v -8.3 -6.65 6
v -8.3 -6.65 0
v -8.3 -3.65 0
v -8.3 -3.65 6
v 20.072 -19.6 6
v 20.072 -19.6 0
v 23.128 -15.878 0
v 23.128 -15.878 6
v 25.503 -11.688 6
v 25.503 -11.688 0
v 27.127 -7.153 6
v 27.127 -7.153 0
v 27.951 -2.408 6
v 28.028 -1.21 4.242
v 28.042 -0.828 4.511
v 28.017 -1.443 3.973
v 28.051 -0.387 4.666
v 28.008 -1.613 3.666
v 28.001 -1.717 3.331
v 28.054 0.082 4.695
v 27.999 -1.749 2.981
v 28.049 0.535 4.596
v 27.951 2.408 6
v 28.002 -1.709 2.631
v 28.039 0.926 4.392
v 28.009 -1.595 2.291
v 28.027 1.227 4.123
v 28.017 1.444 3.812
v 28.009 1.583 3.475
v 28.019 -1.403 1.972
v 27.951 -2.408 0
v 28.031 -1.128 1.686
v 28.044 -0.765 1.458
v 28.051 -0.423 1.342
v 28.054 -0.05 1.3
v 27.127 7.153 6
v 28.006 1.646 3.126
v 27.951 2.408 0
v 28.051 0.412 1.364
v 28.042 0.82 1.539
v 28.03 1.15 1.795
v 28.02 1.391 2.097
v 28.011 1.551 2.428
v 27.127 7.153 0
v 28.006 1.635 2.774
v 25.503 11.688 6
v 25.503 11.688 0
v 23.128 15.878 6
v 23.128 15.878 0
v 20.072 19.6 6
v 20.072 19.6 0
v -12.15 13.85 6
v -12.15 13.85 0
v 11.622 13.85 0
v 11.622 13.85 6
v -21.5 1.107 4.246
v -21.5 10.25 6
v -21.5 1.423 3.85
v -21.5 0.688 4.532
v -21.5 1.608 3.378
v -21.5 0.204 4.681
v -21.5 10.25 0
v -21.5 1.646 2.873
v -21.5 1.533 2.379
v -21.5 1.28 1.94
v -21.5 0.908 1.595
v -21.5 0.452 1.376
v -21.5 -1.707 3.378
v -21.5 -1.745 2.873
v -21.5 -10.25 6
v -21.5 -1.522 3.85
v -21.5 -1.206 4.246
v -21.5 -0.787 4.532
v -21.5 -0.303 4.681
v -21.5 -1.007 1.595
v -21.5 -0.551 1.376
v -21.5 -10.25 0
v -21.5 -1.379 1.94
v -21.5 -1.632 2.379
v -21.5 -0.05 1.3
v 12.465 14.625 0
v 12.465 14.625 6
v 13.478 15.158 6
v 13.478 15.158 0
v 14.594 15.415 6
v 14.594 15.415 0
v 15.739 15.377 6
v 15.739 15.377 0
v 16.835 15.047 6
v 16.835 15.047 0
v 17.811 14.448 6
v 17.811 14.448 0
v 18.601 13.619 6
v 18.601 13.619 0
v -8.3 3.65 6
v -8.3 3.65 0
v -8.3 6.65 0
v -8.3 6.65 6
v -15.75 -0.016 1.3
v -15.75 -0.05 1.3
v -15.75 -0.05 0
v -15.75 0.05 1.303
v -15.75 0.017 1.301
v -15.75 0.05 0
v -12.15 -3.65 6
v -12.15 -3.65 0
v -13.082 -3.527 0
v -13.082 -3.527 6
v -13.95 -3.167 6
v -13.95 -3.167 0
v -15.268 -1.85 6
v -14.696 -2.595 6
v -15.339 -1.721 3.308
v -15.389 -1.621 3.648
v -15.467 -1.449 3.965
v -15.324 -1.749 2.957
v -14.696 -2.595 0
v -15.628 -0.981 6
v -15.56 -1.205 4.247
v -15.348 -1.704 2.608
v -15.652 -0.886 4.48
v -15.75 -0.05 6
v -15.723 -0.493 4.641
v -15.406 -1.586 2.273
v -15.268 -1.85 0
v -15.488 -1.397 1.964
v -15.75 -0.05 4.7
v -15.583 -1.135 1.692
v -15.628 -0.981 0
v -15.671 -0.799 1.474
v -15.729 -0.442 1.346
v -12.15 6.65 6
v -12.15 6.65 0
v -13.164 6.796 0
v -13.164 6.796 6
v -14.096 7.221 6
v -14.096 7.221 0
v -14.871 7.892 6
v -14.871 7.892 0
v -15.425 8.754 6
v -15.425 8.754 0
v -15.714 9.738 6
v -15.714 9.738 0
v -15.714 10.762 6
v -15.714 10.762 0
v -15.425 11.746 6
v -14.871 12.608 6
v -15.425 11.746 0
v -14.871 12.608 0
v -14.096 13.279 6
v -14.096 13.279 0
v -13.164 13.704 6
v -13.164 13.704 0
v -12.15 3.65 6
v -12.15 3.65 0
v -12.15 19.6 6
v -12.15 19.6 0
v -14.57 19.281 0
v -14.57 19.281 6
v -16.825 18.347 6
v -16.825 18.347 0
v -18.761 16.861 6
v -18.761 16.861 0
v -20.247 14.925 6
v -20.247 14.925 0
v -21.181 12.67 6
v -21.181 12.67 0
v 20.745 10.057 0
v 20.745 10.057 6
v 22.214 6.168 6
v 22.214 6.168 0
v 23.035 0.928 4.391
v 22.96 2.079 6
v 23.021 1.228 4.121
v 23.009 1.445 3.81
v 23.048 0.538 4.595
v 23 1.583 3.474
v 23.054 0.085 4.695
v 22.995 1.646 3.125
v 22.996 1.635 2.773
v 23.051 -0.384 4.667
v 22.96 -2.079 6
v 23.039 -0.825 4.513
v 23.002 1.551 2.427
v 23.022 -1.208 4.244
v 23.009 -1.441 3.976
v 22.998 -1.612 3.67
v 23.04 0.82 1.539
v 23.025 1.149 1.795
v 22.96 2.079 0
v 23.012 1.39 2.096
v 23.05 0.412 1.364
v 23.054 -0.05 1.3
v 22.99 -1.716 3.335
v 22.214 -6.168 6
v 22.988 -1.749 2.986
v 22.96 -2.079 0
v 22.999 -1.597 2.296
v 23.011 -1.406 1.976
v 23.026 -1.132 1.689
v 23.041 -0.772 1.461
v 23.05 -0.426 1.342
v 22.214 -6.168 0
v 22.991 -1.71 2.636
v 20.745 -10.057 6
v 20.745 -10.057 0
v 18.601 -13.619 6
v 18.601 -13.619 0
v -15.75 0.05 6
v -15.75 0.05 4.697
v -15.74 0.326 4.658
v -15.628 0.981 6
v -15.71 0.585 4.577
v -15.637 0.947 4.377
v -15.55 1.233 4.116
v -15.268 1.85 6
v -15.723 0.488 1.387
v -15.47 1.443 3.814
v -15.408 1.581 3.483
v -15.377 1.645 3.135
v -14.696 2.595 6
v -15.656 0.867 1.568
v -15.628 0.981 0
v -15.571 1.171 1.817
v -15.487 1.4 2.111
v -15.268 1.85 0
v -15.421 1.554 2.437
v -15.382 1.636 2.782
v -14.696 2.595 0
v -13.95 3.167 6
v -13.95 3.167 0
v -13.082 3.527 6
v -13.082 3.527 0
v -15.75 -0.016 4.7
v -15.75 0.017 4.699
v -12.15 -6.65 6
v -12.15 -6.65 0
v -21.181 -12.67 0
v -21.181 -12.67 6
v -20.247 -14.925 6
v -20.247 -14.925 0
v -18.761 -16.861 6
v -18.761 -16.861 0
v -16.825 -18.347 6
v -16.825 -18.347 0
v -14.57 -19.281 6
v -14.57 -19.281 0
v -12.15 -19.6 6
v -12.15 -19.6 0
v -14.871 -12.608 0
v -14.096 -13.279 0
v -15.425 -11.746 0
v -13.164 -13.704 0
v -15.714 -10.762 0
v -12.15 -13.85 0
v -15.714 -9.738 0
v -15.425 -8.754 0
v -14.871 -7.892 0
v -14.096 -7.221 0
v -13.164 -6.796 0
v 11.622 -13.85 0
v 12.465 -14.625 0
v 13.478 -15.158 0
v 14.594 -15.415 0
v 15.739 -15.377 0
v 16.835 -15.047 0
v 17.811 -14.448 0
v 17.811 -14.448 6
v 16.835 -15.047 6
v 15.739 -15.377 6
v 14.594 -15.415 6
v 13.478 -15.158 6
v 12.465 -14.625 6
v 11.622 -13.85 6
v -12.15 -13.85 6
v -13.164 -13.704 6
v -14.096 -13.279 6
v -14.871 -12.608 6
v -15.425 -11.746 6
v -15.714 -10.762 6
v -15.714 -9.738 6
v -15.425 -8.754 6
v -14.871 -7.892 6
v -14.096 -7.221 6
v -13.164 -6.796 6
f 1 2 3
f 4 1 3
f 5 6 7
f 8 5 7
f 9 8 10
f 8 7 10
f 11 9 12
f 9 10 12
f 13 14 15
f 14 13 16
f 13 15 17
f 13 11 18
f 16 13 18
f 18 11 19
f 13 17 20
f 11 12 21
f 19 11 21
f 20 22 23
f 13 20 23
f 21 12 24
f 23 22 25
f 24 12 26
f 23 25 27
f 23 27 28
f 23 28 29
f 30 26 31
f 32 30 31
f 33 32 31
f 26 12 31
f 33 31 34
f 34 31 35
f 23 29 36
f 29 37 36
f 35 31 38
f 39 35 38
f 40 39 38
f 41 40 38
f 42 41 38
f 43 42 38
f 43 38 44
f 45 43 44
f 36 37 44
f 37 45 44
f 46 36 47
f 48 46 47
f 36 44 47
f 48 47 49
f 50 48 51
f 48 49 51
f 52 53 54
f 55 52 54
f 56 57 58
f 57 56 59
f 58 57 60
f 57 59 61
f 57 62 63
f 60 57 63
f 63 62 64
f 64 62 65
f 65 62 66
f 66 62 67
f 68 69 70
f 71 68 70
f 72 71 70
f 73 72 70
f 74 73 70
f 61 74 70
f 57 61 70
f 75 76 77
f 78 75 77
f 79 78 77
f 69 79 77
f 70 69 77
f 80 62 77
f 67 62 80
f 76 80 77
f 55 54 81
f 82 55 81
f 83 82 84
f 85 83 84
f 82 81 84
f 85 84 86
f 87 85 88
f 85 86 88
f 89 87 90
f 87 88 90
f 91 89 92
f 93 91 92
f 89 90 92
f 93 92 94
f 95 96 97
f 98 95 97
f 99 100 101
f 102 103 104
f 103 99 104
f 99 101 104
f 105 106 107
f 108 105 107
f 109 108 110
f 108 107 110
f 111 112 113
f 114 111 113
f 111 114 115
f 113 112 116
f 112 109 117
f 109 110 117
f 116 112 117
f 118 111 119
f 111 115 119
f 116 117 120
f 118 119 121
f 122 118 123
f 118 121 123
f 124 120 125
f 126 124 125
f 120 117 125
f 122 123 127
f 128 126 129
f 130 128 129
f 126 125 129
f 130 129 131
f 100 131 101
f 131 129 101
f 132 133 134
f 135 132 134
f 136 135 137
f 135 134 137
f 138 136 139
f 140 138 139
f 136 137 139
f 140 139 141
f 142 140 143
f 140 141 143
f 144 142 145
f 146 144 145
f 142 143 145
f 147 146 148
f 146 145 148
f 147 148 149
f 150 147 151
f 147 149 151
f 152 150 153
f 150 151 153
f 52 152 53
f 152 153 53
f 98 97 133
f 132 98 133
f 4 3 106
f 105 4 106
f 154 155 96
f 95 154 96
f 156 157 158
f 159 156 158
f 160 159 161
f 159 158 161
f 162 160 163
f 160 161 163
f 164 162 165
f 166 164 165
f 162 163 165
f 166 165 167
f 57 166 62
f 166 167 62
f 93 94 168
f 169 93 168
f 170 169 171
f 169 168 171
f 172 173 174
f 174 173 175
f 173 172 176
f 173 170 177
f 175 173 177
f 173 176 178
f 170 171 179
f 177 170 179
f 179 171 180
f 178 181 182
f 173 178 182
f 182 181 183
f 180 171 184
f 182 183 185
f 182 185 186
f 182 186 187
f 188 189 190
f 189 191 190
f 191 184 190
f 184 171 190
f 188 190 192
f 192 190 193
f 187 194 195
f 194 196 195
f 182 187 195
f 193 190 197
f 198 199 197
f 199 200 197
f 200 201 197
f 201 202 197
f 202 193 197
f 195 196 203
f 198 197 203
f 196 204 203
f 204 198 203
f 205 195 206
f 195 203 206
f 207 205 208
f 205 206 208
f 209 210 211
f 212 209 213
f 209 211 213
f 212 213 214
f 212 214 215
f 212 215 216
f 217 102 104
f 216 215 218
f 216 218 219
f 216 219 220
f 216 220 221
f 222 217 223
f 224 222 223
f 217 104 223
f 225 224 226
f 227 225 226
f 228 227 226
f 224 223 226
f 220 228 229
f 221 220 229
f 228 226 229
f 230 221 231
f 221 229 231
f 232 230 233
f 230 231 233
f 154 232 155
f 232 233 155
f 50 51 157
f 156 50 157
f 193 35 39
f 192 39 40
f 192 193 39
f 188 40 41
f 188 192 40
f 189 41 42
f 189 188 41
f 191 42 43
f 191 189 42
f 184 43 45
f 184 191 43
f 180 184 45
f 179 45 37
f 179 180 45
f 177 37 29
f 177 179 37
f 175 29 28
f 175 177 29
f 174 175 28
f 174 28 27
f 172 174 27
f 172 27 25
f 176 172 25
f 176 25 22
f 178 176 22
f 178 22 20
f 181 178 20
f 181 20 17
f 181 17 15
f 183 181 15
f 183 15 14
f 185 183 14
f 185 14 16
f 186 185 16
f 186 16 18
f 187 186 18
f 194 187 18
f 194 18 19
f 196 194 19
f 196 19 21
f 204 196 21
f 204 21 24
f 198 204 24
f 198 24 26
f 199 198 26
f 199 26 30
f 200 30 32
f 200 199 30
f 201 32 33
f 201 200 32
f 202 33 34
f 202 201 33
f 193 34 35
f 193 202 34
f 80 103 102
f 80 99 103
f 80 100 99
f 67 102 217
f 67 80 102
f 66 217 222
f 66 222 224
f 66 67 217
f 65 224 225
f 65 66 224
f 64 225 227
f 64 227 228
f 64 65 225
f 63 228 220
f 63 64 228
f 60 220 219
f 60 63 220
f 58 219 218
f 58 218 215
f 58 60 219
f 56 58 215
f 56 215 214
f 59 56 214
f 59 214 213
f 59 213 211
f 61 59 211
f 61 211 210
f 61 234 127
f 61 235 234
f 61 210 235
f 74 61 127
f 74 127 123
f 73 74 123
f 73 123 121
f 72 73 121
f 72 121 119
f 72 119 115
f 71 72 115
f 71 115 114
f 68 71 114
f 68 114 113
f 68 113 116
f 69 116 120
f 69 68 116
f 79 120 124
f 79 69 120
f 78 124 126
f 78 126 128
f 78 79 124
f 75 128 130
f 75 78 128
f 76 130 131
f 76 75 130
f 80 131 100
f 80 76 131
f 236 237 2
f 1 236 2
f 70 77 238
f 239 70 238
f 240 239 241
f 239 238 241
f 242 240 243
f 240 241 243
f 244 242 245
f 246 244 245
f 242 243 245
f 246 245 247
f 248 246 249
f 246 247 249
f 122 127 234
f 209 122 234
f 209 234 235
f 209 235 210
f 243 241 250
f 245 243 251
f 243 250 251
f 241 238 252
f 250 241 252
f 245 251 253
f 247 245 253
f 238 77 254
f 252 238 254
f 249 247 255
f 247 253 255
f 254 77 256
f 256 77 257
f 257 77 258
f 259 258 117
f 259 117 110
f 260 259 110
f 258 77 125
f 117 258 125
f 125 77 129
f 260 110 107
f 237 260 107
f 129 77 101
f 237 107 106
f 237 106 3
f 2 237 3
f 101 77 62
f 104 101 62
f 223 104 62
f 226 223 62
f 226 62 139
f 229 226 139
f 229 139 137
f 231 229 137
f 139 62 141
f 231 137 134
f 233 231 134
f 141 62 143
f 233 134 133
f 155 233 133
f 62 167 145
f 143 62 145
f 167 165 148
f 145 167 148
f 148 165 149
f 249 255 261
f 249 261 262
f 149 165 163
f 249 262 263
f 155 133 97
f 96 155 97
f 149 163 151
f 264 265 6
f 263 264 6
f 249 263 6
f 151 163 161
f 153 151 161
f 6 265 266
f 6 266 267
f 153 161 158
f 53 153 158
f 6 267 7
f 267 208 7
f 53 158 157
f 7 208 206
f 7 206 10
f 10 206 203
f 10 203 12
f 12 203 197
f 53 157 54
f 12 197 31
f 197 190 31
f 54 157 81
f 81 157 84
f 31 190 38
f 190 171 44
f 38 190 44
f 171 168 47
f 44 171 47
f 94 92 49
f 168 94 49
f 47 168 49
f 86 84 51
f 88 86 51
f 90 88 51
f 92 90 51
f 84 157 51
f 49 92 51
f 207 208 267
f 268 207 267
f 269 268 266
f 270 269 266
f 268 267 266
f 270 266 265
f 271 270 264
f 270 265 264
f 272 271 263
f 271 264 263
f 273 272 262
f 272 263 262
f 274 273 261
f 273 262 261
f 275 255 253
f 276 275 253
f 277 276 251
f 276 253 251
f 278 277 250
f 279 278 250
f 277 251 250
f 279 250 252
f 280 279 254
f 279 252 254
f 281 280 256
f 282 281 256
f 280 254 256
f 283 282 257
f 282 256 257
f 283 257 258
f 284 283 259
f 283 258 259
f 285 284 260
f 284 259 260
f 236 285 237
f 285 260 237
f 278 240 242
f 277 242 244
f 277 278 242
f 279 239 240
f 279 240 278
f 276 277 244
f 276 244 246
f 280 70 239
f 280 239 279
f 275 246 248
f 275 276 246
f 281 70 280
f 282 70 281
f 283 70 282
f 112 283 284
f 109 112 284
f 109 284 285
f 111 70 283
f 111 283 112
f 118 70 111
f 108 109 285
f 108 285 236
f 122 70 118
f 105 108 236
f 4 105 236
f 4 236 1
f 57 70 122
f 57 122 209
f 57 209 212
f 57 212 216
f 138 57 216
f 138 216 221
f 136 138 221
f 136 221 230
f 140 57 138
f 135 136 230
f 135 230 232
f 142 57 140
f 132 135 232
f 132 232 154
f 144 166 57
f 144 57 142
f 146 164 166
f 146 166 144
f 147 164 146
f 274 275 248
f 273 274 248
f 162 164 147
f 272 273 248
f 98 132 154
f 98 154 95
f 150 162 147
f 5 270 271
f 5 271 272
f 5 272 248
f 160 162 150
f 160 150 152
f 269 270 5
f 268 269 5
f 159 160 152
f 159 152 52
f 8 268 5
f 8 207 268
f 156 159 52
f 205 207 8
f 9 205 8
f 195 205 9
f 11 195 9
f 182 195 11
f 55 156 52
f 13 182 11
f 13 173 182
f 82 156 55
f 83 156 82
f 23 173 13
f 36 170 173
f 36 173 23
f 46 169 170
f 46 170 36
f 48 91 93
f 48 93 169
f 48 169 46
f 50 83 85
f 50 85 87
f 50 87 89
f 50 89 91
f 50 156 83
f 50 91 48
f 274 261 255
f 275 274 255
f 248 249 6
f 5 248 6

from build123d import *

# Parameters (mm, degrees)
EXTRUDE_1_DEPTH          = 6
CUT_EXTRUDE_1_DEPTH      = 35.74465435
CUT_EXTRUDE_1_DEPTH_BACK = 35.74465435
SKETCH_2_R               = 1.7


with BuildPart() as part:
    # 草图1 → 凸台-拉伸1 (new body)
    with BuildSketch(Plane.XY):
        with BuildLine():
            Line((20.071646816, 19.6), (-12.15, 19.6))
            ThreePointArc((-12.15, 19.6), (-18.761448404, 16.861448404), (-21.5, 10.25))
            Line((-21.5, 10.25), (-21.5, -10.25))
            ThreePointArc((-21.5, -10.25), (-18.761448404, -16.861448404), (-12.15, -19.6))
            Line((-12.15, -19.6), (20.071646816, -19.6))
            ThreePointArc((20.071646816, -19.6), (28.054072893, 0), (20.071646816, 19.6))
        make_face()
        with BuildLine():
            ThreePointArc((11.6217341, 13.850243366), (15.167616283, 15.432881266), (18.601156804, 13.619370123))
            ThreePointArc((18.601156804, 13.619370123), (23.054072893, 0), (18.601156804, -13.619370123))
            ThreePointArc((18.601156804, -13.619370123), (15.167616283, -15.432881266), (11.6217341, -13.850243366))
            Line((11.6217341, -13.850243366), (-12.15, -13.850243366))
            ThreePointArc((-12.15, -13.850243366), (-15.750243366, -10.25), (-12.15, -6.649756634))
            Line((-12.15, -6.649756634), (-8.3, -6.649756634))
            Line((-8.3, -6.649756634), (-8.3, -3.649756634))
            Line((-8.3, -3.649756634), (-12.15, -3.649756634))
            ThreePointArc((-12.15, -3.649756634), (-14.695756498, -2.595269766), (-15.750243366, -0.049513268))
            Line((-15.750243366, -0.049513268), (-15.750243366, 0.049513268))
            ThreePointArc((-15.750243366, 0.049513268), (-14.695756498, 2.595269766), (-12.15, 3.649756634))
            Line((-12.15, 3.649756634), (-8.3, 3.649756634))
            Line((-8.3, 3.649756634), (-8.3, 6.649756634))
            Line((-8.3, 6.649756634), (-12.15, 6.649756634))
            ThreePointArc((-12.15, 6.649756634), (-15.750243366, 10.25), (-12.15, 13.850243366))
            Line((-12.15, 13.850243366), (11.6217341, 13.850243366))
        make_face(mode=Mode.SUBTRACT)
    extrude(amount=EXTRUDE_1_DEPTH)

    # 草图2 → 切除-拉伸1 (cut, two sides: drawn at the far end of the back side and taken through both)
    with BuildSketch(Plane(origin=(0, 0, 0), x_dir=(0, 0, -1), z_dir=(1, 0, 0)).offset(-CUT_EXTRUDE_1_DEPTH_BACK)):
        with Locations((-3, -0.049513268)):
            Circle(SKETCH_2_R)
    extrude(amount=CUT_EXTRUDE_1_DEPTH + CUT_EXTRUDE_1_DEPTH_BACK, mode=Mode.SUBTRACT)


solid = part.part
